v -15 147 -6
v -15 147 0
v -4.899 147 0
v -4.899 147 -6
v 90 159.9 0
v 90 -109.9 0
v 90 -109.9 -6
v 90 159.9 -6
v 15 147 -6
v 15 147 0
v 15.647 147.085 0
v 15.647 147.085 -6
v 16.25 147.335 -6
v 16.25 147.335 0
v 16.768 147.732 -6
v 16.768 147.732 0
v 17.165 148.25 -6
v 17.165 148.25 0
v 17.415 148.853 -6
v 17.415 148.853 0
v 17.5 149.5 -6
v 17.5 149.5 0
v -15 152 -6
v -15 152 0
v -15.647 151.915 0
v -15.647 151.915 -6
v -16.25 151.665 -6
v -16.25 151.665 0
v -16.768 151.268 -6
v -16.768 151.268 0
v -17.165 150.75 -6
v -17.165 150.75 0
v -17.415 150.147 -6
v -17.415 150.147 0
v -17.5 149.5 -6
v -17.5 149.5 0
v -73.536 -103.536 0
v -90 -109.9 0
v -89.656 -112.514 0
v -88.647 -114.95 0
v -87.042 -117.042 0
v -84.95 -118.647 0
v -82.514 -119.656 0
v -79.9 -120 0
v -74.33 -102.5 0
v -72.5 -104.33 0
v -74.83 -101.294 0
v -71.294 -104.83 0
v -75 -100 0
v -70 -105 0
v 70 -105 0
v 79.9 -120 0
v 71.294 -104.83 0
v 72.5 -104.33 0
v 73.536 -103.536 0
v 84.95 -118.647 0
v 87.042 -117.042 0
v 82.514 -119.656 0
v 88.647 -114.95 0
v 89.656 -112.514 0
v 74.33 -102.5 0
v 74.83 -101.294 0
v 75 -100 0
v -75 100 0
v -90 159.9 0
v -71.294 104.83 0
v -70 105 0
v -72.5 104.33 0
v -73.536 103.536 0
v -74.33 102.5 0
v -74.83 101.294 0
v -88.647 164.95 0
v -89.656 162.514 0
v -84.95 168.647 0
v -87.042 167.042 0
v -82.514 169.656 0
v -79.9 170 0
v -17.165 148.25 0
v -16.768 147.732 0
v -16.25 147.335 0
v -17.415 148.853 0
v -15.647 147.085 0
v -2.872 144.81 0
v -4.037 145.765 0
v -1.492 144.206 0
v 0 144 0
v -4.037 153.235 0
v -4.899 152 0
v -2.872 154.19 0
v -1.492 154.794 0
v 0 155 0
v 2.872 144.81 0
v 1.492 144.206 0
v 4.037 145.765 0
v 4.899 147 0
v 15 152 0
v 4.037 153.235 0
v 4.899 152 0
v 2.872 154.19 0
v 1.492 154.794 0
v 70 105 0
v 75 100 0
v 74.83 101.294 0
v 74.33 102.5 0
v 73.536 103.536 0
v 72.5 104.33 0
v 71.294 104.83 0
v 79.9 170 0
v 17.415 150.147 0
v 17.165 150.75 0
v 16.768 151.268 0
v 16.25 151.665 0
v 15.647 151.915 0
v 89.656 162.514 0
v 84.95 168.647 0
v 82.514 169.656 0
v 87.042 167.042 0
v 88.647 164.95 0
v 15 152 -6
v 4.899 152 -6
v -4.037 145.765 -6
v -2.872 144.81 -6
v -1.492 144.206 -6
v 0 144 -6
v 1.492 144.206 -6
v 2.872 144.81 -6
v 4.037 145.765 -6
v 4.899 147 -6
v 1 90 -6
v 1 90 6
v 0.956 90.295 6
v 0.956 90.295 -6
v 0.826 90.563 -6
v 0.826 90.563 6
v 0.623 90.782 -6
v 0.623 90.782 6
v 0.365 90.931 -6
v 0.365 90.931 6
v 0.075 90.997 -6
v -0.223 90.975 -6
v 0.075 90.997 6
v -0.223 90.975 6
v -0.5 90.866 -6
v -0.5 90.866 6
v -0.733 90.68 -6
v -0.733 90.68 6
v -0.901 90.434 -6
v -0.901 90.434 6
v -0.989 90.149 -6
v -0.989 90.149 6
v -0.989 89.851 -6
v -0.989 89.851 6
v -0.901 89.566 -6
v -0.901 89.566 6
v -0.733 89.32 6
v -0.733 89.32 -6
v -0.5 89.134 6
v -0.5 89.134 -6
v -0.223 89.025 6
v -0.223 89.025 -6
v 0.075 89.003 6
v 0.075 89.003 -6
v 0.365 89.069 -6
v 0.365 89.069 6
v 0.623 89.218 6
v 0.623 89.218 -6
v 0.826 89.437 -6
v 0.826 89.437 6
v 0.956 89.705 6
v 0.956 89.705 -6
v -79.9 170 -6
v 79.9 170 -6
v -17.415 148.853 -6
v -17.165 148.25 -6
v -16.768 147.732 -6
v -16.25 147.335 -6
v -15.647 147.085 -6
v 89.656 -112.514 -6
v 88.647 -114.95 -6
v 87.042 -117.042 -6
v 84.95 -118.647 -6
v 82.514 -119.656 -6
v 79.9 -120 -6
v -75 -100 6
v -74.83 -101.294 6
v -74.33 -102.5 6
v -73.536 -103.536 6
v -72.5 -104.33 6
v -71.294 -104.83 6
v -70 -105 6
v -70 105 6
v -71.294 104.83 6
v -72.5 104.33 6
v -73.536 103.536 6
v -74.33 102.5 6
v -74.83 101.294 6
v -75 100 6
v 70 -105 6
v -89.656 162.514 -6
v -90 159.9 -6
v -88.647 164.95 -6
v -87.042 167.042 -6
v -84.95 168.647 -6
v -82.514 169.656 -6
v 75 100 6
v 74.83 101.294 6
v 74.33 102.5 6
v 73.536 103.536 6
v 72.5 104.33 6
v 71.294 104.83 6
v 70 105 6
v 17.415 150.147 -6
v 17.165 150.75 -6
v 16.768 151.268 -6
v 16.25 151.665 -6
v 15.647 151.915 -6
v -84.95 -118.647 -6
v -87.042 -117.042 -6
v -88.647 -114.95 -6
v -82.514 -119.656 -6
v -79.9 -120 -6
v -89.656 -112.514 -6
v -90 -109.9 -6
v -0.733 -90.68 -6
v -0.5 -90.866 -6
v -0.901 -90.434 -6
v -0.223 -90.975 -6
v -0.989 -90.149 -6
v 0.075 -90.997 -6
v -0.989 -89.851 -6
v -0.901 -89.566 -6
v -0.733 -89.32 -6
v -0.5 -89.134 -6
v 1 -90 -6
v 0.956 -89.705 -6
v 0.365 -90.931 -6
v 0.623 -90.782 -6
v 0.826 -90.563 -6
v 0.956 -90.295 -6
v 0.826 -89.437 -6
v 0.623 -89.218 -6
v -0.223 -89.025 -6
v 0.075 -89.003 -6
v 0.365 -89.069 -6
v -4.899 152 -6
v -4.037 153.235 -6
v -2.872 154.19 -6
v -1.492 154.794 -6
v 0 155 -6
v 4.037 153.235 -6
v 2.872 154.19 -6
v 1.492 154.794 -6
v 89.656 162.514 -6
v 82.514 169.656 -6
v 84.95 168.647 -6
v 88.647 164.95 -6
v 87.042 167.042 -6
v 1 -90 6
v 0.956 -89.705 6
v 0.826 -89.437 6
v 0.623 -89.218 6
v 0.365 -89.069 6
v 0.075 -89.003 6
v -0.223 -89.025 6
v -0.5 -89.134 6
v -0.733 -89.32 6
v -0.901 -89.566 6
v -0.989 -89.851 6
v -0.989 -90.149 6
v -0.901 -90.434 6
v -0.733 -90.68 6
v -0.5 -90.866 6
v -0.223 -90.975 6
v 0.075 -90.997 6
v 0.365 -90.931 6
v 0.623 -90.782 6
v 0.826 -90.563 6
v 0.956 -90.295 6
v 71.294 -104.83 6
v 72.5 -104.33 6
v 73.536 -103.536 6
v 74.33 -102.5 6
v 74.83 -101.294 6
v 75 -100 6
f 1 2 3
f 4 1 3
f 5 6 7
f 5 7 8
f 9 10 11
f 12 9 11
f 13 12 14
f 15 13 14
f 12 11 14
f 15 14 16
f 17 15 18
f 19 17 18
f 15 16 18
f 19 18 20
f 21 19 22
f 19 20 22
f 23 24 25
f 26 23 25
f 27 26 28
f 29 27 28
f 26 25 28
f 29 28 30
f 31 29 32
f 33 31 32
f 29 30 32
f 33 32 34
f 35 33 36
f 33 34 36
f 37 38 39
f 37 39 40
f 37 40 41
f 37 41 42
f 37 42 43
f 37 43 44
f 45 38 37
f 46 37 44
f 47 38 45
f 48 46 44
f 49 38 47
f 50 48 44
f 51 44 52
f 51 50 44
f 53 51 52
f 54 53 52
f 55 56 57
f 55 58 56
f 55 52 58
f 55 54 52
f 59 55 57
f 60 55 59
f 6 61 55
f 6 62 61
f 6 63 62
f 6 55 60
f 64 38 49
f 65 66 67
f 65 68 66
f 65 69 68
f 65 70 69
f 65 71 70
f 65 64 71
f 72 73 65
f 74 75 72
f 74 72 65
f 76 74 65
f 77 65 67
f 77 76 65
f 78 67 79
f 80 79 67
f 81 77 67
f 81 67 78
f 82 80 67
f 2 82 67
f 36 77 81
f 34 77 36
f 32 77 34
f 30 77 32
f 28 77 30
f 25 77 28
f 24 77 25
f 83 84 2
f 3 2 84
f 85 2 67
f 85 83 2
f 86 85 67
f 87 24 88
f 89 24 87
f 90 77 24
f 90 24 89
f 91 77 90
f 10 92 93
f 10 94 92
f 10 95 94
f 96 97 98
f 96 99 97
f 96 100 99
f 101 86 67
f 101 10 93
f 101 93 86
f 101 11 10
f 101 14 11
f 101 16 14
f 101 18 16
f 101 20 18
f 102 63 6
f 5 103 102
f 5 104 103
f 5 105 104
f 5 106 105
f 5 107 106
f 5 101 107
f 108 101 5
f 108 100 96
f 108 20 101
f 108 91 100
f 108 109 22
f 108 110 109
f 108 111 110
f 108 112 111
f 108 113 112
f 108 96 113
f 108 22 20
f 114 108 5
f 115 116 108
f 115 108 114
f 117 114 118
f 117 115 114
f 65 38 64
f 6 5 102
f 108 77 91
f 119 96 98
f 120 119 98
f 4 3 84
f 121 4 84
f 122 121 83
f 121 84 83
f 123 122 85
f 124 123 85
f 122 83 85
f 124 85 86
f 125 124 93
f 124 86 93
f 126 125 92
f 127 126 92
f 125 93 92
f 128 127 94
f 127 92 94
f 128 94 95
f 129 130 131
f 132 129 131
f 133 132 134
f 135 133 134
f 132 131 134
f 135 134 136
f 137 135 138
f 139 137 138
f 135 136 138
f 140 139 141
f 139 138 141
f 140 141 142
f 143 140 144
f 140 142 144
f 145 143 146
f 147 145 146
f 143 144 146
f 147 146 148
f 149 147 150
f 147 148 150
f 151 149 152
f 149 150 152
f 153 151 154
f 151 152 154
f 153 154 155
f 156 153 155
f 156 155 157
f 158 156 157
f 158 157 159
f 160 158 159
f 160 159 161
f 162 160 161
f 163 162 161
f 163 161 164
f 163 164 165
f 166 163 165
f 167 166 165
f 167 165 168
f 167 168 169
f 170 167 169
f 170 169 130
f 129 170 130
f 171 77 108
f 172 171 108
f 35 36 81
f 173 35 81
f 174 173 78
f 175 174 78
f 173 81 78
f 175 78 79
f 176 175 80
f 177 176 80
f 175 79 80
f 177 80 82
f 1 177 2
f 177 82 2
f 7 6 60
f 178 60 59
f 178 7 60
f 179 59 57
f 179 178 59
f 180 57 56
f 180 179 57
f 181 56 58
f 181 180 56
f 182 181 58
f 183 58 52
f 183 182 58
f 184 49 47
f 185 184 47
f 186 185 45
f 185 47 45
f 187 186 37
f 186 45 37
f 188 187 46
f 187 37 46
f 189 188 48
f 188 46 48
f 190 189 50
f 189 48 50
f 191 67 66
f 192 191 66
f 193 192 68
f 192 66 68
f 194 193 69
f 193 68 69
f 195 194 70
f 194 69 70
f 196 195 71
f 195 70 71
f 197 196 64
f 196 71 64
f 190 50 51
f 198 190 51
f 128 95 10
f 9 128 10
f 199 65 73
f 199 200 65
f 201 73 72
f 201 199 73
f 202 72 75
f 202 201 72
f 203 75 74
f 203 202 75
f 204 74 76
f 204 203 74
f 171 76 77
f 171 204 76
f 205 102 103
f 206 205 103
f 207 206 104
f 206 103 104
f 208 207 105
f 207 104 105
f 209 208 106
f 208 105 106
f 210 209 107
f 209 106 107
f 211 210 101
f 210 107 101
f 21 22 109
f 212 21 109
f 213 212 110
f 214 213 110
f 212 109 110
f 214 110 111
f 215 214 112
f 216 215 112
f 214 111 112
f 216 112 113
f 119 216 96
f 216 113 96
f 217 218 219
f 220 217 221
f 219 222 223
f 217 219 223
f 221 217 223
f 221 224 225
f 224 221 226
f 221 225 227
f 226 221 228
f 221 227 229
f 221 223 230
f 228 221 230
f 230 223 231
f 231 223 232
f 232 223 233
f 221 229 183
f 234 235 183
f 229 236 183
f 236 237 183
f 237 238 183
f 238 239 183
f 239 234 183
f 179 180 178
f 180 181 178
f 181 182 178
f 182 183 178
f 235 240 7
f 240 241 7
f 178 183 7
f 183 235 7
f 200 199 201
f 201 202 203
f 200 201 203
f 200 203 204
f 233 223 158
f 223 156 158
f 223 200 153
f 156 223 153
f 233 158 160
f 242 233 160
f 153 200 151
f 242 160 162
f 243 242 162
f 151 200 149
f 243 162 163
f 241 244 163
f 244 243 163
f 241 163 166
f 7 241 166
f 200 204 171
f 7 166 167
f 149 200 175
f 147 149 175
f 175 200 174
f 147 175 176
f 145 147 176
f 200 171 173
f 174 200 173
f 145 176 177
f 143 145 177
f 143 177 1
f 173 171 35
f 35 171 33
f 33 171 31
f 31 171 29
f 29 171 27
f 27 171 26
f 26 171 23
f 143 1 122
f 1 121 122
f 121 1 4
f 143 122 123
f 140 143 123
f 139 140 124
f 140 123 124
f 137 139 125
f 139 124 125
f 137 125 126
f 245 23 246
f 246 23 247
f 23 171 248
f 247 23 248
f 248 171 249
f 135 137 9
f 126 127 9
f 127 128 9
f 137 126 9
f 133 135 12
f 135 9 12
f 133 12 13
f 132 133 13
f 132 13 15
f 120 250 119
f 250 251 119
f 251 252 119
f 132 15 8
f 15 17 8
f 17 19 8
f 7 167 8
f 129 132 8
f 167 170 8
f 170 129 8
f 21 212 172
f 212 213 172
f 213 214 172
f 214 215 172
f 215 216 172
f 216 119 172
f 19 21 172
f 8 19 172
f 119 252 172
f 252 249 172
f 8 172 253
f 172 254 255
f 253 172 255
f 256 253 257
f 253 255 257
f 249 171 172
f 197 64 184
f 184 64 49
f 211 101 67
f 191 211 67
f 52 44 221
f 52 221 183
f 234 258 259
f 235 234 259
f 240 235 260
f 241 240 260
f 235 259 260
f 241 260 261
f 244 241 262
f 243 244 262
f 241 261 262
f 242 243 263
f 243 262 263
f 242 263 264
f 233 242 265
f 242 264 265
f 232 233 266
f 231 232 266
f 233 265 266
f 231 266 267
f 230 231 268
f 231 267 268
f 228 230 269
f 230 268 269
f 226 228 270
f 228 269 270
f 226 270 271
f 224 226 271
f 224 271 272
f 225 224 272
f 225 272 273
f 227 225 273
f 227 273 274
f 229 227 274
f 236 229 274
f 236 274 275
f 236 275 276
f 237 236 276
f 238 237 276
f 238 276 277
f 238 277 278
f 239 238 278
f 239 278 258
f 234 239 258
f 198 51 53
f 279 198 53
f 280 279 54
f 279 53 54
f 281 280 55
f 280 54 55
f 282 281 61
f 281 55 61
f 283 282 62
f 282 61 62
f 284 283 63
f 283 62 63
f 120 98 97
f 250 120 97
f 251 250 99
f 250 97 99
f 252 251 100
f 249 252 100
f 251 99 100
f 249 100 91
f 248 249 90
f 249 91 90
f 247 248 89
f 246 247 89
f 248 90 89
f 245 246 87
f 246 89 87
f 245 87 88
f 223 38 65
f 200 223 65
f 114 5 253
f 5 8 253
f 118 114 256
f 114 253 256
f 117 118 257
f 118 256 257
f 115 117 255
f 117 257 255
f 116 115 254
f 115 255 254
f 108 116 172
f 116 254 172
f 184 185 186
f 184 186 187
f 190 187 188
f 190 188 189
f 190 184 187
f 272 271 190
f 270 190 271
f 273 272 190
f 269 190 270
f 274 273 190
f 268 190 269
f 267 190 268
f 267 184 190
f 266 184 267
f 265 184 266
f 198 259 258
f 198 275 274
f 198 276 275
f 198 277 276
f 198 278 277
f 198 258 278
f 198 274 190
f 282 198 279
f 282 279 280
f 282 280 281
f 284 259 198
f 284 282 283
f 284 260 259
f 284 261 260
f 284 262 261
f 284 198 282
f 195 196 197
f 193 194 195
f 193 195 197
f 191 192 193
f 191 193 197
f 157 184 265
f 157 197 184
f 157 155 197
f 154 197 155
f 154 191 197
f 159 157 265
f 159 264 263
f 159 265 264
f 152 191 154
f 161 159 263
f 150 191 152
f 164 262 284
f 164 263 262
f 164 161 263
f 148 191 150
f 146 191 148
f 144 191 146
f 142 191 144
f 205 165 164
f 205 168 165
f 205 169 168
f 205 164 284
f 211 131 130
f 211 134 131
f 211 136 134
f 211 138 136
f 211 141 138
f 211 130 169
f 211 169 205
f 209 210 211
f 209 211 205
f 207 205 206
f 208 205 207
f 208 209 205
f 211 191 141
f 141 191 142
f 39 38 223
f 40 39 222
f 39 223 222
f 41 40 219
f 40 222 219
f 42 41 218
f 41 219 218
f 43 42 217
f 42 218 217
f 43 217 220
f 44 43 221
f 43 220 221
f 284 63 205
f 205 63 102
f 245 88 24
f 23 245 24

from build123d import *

# Parameters (mm, degrees)
F1_DEPTH  = 6
F2_W      = 180
F2_H      = 240
F3_DEPTH  = 6
F4_W      = 180
F4_H      = 50
F5_DEPTH  = 6
F6_R      = 10.1
F8_DEPTH  = 25
F9_R      = 1
F10_DEPTH = 25


with BuildPart() as f1:
    # F0 (on Top) → F1 (new body)
    with BuildSketch(Plane.XY):
        with BuildLine():
            ThreePointArc((75, 100), (73.5355339059, 103.5355339059), (70, 105))
            Line((70, 105), (-70, 105))
            ThreePointArc((-70, 105), (-73.5355339059, 103.5355339059), (-75, 100))
            Line((-75, 100), (-75, -100))
            ThreePointArc((-75, -100), (-73.5355339059, -103.5355339059), (-70, -105))
            Line((-70, -105), (70, -105))
            ThreePointArc((70, -105), (73.5355339059, -103.5355339059), (75, -100))
            Line((75, -100), (75, 100))
        make_face()
    extrude(amount=F1_DEPTH)

    # F2 (on face) → F3 (join)
    with BuildSketch(Plane(origin=(0, 0, 0), x_dir=(1, 0, 0), z_dir=(0, 0, -1))):
        Rectangle(F2_W, F2_H)
        with BuildLine():
            ThreePointArc((75, -100), (73.5355339059, -103.5355339059), (70, -105))
            Line((70, -105), (-70, -105))
            ThreePointArc((-70, -105), (-73.5355339059, -103.5355339059), (-75, -100))
            Line((-75, -100), (-75, 100))
            ThreePointArc((-75, 100), (-73.5355339059, 103.5355339059), (-70, 105))
            Line((-70, 105), (70, 105))
            ThreePointArc((70, 105), (73.5355339059, 103.5355339059), (75, 100))
            Line((75, 100), (75, -100))
        make_face(mode=Mode.SUBTRACT)
        with BuildLine():
            Line((-70, -105), (70, -105))
            ThreePointArc((70, -105), (73.5355339059, -103.5355339059), (75, -100))
            Line((75, -100), (75, 100))
            ThreePointArc((75, 100), (73.5355339059, 103.5355339059), (70, 105))
            Line((70, 105), (-70, 105))
            ThreePointArc((-70, 105), (-73.5355339059, 103.5355339059), (-75, 100))
            Line((-75, 100), (-75, -100))
            ThreePointArc((-75, -100), (-73.5355339059, -103.5355339059), (-70, -105))
        make_face()
    extrude(amount=F3_DEPTH)

    # F4 (on face) → F5 (join)
    with BuildSketch(Plane.XY):
        with Locations((0, 145)):
            Rectangle(F4_W, F4_H)
    extrude(amount=-F5_DEPTH)

    # F6
    f6_edges = [f1.edges().sort_by_distance(p)[0] for p in [
        (-90, 170, -3),
        (90, 170, -3),
        (-90, -120, -3),
        (90, -120, -3),
    ]]
    fillet(f6_edges, radius=F6_R)

    # F7 (on face) → F8 (cut)
    with BuildSketch(Plane.XY):
        with BuildLine():
            ThreePointArc((4.8989794856, 147), (5.3476343915, 148.2143848108), (5.5, 149.5))
            ThreePointArc((5.5, 149.5), (5.3476343915, 150.7856151892), (4.8989794856, 152))
            Line((4.8989794856, 152), (-4.8989794856, 152))
            ThreePointArc((-4.8989794856, 152), (-5.5, 149.5), (-4.8989794856, 147))
            Line((-4.8989794856, 147), (4.8989794856, 147))
        make_face()
        with BuildLine():
            ThreePointArc((4.8989794856, 152), (5.3476343915, 150.7856151892), (5.5, 149.5))
            ThreePointArc((5.5, 149.5), (5.3476343915, 148.2143848108), (4.8989794856, 147))
            Line((4.8989794856, 147), (15, 147))
            ThreePointArc((15, 147), (16.767766953, 147.732233047), (17.5, 149.5))
            ThreePointArc((17.5, 149.5), (16.767766953, 151.267766953), (15, 152))
            Line((15, 152), (4.8989794856, 152))
        make_face()
        with BuildLine():
            Line((-4.8989794856, 152), (4.8989794856, 152))
            ThreePointArc((4.8989794856, 152), (0, 155), (-4.8989794856, 152))
        make_face()
        with BuildLine():
            ThreePointArc((-4.8989794856, 147), (0, 144), (4.8989794856, 147))
            Line((4.8989794856, 147), (-4.8989794856, 147))
        make_face()
        with BuildLine():
            ThreePointArc((-4.8989794856, 147), (-5.5, 149.5), (-4.8989794856, 152))
            Line((-4.8989794856, 152), (-15, 152))
            ThreePointArc((-15, 152), (-16.767766953, 151.267766953), (-17.5, 149.5))
            ThreePointArc((-17.5, 149.5), (-16.767766953, 147.732233047), (-15, 147))
            Line((-15, 147), (-4.8989794856, 147))
        make_face()
    extrude(amount=-F8_DEPTH, mode=Mode.SUBTRACT)

    # F9 (on face) → F10 (cut)
    with BuildSketch(Plane.XY.offset(6)):
        with Locations((0, 90)):
            Circle(F9_R)
        with Locations((0, -90)):
            Circle(F9_R)
    extrude(amount=-F10_DEPTH, mode=Mode.SUBTRACT)


solid = f1.part
